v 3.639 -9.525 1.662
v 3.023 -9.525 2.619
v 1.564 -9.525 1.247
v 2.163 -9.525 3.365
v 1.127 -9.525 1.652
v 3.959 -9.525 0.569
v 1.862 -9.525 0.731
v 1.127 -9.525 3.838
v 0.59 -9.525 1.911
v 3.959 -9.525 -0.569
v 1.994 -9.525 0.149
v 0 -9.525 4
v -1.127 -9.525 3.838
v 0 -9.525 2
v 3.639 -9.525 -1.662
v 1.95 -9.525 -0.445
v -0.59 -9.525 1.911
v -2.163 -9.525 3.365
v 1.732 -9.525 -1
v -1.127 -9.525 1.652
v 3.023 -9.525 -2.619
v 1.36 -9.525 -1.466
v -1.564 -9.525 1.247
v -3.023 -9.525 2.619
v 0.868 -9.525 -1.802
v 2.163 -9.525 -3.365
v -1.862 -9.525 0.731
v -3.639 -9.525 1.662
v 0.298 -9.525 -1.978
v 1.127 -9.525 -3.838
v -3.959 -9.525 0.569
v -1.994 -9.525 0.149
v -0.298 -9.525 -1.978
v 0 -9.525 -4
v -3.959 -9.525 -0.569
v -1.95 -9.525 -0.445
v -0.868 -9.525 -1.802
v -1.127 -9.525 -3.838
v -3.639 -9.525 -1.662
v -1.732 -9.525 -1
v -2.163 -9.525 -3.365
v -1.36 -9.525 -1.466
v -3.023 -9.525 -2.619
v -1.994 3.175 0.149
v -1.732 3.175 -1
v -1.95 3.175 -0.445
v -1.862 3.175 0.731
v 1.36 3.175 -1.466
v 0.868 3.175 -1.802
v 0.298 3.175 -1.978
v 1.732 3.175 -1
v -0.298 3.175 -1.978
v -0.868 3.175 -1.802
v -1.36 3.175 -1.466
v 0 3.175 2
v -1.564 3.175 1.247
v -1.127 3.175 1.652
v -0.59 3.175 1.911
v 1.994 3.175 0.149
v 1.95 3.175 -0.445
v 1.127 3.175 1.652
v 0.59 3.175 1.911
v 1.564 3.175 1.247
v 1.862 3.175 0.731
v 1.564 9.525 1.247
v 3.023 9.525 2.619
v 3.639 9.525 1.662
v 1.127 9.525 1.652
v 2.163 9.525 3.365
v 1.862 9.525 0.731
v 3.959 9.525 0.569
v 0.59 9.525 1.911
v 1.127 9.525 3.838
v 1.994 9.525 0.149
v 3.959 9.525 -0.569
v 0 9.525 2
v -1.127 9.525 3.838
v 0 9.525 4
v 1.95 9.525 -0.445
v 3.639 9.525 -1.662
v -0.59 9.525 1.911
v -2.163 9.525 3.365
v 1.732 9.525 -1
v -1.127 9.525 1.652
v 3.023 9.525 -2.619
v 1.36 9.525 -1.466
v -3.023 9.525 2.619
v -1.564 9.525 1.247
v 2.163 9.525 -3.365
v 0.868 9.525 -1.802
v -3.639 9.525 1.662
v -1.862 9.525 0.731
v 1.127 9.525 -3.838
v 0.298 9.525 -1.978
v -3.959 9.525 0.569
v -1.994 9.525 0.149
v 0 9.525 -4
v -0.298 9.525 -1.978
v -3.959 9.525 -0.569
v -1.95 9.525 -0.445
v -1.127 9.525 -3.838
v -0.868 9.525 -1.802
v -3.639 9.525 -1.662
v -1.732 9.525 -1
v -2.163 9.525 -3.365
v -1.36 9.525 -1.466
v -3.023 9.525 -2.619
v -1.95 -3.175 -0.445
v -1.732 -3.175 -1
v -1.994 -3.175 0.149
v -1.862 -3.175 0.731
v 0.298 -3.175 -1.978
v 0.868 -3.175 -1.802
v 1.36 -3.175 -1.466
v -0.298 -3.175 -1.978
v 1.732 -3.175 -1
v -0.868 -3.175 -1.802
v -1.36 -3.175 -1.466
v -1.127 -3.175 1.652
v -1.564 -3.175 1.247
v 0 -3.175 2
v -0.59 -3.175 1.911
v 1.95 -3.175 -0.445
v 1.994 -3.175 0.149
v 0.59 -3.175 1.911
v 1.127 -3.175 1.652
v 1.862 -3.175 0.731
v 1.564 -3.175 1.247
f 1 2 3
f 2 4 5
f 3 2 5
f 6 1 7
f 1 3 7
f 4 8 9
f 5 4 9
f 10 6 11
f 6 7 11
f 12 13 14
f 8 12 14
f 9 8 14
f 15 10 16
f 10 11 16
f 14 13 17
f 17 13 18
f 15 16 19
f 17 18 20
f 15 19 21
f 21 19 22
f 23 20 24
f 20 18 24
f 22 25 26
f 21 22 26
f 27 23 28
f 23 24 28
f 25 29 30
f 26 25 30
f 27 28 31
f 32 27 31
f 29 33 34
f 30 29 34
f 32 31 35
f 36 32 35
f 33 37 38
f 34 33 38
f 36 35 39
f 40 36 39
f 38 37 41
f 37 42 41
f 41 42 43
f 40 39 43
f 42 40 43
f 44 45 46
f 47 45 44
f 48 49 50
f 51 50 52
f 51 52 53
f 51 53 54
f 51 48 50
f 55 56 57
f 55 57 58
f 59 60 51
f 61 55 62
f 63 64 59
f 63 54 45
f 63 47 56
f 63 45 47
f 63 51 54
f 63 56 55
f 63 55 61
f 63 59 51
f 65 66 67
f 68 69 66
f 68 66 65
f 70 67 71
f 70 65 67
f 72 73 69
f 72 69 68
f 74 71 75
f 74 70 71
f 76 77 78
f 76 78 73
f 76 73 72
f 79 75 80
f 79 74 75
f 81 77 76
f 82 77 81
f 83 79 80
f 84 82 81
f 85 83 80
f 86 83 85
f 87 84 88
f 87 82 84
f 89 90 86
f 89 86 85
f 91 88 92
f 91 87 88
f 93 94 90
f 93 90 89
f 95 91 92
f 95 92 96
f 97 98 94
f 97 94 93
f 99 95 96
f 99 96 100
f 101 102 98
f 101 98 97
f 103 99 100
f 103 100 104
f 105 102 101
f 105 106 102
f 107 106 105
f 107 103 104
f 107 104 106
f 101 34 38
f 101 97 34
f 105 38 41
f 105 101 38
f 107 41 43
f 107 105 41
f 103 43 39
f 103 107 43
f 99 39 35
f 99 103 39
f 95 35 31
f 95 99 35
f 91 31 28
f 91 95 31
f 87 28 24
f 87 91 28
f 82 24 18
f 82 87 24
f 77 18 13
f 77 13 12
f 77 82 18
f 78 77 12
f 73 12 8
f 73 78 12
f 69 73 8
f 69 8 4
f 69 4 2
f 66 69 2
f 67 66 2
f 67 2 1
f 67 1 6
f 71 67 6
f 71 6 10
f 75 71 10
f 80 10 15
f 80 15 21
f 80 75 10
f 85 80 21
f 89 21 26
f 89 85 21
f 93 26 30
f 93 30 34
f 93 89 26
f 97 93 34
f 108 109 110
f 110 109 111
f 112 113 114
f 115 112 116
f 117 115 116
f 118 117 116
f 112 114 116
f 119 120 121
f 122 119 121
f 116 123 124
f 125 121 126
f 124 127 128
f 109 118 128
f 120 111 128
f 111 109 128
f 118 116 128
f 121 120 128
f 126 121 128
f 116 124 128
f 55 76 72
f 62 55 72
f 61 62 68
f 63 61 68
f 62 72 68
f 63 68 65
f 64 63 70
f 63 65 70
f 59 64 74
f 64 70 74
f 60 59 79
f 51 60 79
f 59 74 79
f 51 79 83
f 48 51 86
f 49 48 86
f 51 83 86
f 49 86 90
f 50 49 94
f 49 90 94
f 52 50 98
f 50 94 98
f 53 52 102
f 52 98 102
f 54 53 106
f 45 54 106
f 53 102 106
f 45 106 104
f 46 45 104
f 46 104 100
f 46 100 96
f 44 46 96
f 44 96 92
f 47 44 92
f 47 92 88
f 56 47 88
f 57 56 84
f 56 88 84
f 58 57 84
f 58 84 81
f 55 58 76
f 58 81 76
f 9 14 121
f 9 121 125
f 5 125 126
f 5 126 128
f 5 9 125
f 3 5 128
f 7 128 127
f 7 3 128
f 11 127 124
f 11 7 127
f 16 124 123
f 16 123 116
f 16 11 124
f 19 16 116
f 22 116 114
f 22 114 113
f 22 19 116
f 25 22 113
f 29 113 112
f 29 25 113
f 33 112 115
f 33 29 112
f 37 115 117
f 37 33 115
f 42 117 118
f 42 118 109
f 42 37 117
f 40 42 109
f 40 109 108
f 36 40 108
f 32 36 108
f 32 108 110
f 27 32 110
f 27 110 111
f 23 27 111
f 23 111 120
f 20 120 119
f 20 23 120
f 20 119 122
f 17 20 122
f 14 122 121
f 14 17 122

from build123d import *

# Parameters (mm, degrees)
SKETCH2_R           = 4
BOSS_EXTRUDE2_DEPTH = 9.525
SKETCH3_R           = 2
CUT_EXTRUDE1_DEPTH  = 6.35


with BuildPart() as part:
    # Sketch2 → Boss-Extrude2 (new, symmetric)
    with BuildSketch(Plane(origin=(0, 0, 0), x_dir=(1, 0, 0), z_dir=(0, 1, 0))):
        with Locations(Location((0, 0, 0), (0, 0, 90))):
            Circle(SKETCH2_R)
    extrude(amount=BOSS_EXTRUDE2_DEPTH, both=True)

    # Sketch3 → Cut-Extrude1 (cut)
    with BuildSketch(Plane(origin=(0, 9.525, 0), x_dir=(1, 0, 0), z_dir=(0, 1, 0))):
        with Locations(Location((0, 0, 0), (0, 0, 270))):
            Circle(SKETCH3_R)
    cut_extrude1 = extrude(amount=-CUT_EXTRUDE1_DEPTH, mode=Mode.SUBTRACT)

    # Mirror1: Cut-Extrude1 across plane
    add(cut_extrude1.mirror(Plane.ZX), mode=Mode.SUBTRACT)


solid = part.part
